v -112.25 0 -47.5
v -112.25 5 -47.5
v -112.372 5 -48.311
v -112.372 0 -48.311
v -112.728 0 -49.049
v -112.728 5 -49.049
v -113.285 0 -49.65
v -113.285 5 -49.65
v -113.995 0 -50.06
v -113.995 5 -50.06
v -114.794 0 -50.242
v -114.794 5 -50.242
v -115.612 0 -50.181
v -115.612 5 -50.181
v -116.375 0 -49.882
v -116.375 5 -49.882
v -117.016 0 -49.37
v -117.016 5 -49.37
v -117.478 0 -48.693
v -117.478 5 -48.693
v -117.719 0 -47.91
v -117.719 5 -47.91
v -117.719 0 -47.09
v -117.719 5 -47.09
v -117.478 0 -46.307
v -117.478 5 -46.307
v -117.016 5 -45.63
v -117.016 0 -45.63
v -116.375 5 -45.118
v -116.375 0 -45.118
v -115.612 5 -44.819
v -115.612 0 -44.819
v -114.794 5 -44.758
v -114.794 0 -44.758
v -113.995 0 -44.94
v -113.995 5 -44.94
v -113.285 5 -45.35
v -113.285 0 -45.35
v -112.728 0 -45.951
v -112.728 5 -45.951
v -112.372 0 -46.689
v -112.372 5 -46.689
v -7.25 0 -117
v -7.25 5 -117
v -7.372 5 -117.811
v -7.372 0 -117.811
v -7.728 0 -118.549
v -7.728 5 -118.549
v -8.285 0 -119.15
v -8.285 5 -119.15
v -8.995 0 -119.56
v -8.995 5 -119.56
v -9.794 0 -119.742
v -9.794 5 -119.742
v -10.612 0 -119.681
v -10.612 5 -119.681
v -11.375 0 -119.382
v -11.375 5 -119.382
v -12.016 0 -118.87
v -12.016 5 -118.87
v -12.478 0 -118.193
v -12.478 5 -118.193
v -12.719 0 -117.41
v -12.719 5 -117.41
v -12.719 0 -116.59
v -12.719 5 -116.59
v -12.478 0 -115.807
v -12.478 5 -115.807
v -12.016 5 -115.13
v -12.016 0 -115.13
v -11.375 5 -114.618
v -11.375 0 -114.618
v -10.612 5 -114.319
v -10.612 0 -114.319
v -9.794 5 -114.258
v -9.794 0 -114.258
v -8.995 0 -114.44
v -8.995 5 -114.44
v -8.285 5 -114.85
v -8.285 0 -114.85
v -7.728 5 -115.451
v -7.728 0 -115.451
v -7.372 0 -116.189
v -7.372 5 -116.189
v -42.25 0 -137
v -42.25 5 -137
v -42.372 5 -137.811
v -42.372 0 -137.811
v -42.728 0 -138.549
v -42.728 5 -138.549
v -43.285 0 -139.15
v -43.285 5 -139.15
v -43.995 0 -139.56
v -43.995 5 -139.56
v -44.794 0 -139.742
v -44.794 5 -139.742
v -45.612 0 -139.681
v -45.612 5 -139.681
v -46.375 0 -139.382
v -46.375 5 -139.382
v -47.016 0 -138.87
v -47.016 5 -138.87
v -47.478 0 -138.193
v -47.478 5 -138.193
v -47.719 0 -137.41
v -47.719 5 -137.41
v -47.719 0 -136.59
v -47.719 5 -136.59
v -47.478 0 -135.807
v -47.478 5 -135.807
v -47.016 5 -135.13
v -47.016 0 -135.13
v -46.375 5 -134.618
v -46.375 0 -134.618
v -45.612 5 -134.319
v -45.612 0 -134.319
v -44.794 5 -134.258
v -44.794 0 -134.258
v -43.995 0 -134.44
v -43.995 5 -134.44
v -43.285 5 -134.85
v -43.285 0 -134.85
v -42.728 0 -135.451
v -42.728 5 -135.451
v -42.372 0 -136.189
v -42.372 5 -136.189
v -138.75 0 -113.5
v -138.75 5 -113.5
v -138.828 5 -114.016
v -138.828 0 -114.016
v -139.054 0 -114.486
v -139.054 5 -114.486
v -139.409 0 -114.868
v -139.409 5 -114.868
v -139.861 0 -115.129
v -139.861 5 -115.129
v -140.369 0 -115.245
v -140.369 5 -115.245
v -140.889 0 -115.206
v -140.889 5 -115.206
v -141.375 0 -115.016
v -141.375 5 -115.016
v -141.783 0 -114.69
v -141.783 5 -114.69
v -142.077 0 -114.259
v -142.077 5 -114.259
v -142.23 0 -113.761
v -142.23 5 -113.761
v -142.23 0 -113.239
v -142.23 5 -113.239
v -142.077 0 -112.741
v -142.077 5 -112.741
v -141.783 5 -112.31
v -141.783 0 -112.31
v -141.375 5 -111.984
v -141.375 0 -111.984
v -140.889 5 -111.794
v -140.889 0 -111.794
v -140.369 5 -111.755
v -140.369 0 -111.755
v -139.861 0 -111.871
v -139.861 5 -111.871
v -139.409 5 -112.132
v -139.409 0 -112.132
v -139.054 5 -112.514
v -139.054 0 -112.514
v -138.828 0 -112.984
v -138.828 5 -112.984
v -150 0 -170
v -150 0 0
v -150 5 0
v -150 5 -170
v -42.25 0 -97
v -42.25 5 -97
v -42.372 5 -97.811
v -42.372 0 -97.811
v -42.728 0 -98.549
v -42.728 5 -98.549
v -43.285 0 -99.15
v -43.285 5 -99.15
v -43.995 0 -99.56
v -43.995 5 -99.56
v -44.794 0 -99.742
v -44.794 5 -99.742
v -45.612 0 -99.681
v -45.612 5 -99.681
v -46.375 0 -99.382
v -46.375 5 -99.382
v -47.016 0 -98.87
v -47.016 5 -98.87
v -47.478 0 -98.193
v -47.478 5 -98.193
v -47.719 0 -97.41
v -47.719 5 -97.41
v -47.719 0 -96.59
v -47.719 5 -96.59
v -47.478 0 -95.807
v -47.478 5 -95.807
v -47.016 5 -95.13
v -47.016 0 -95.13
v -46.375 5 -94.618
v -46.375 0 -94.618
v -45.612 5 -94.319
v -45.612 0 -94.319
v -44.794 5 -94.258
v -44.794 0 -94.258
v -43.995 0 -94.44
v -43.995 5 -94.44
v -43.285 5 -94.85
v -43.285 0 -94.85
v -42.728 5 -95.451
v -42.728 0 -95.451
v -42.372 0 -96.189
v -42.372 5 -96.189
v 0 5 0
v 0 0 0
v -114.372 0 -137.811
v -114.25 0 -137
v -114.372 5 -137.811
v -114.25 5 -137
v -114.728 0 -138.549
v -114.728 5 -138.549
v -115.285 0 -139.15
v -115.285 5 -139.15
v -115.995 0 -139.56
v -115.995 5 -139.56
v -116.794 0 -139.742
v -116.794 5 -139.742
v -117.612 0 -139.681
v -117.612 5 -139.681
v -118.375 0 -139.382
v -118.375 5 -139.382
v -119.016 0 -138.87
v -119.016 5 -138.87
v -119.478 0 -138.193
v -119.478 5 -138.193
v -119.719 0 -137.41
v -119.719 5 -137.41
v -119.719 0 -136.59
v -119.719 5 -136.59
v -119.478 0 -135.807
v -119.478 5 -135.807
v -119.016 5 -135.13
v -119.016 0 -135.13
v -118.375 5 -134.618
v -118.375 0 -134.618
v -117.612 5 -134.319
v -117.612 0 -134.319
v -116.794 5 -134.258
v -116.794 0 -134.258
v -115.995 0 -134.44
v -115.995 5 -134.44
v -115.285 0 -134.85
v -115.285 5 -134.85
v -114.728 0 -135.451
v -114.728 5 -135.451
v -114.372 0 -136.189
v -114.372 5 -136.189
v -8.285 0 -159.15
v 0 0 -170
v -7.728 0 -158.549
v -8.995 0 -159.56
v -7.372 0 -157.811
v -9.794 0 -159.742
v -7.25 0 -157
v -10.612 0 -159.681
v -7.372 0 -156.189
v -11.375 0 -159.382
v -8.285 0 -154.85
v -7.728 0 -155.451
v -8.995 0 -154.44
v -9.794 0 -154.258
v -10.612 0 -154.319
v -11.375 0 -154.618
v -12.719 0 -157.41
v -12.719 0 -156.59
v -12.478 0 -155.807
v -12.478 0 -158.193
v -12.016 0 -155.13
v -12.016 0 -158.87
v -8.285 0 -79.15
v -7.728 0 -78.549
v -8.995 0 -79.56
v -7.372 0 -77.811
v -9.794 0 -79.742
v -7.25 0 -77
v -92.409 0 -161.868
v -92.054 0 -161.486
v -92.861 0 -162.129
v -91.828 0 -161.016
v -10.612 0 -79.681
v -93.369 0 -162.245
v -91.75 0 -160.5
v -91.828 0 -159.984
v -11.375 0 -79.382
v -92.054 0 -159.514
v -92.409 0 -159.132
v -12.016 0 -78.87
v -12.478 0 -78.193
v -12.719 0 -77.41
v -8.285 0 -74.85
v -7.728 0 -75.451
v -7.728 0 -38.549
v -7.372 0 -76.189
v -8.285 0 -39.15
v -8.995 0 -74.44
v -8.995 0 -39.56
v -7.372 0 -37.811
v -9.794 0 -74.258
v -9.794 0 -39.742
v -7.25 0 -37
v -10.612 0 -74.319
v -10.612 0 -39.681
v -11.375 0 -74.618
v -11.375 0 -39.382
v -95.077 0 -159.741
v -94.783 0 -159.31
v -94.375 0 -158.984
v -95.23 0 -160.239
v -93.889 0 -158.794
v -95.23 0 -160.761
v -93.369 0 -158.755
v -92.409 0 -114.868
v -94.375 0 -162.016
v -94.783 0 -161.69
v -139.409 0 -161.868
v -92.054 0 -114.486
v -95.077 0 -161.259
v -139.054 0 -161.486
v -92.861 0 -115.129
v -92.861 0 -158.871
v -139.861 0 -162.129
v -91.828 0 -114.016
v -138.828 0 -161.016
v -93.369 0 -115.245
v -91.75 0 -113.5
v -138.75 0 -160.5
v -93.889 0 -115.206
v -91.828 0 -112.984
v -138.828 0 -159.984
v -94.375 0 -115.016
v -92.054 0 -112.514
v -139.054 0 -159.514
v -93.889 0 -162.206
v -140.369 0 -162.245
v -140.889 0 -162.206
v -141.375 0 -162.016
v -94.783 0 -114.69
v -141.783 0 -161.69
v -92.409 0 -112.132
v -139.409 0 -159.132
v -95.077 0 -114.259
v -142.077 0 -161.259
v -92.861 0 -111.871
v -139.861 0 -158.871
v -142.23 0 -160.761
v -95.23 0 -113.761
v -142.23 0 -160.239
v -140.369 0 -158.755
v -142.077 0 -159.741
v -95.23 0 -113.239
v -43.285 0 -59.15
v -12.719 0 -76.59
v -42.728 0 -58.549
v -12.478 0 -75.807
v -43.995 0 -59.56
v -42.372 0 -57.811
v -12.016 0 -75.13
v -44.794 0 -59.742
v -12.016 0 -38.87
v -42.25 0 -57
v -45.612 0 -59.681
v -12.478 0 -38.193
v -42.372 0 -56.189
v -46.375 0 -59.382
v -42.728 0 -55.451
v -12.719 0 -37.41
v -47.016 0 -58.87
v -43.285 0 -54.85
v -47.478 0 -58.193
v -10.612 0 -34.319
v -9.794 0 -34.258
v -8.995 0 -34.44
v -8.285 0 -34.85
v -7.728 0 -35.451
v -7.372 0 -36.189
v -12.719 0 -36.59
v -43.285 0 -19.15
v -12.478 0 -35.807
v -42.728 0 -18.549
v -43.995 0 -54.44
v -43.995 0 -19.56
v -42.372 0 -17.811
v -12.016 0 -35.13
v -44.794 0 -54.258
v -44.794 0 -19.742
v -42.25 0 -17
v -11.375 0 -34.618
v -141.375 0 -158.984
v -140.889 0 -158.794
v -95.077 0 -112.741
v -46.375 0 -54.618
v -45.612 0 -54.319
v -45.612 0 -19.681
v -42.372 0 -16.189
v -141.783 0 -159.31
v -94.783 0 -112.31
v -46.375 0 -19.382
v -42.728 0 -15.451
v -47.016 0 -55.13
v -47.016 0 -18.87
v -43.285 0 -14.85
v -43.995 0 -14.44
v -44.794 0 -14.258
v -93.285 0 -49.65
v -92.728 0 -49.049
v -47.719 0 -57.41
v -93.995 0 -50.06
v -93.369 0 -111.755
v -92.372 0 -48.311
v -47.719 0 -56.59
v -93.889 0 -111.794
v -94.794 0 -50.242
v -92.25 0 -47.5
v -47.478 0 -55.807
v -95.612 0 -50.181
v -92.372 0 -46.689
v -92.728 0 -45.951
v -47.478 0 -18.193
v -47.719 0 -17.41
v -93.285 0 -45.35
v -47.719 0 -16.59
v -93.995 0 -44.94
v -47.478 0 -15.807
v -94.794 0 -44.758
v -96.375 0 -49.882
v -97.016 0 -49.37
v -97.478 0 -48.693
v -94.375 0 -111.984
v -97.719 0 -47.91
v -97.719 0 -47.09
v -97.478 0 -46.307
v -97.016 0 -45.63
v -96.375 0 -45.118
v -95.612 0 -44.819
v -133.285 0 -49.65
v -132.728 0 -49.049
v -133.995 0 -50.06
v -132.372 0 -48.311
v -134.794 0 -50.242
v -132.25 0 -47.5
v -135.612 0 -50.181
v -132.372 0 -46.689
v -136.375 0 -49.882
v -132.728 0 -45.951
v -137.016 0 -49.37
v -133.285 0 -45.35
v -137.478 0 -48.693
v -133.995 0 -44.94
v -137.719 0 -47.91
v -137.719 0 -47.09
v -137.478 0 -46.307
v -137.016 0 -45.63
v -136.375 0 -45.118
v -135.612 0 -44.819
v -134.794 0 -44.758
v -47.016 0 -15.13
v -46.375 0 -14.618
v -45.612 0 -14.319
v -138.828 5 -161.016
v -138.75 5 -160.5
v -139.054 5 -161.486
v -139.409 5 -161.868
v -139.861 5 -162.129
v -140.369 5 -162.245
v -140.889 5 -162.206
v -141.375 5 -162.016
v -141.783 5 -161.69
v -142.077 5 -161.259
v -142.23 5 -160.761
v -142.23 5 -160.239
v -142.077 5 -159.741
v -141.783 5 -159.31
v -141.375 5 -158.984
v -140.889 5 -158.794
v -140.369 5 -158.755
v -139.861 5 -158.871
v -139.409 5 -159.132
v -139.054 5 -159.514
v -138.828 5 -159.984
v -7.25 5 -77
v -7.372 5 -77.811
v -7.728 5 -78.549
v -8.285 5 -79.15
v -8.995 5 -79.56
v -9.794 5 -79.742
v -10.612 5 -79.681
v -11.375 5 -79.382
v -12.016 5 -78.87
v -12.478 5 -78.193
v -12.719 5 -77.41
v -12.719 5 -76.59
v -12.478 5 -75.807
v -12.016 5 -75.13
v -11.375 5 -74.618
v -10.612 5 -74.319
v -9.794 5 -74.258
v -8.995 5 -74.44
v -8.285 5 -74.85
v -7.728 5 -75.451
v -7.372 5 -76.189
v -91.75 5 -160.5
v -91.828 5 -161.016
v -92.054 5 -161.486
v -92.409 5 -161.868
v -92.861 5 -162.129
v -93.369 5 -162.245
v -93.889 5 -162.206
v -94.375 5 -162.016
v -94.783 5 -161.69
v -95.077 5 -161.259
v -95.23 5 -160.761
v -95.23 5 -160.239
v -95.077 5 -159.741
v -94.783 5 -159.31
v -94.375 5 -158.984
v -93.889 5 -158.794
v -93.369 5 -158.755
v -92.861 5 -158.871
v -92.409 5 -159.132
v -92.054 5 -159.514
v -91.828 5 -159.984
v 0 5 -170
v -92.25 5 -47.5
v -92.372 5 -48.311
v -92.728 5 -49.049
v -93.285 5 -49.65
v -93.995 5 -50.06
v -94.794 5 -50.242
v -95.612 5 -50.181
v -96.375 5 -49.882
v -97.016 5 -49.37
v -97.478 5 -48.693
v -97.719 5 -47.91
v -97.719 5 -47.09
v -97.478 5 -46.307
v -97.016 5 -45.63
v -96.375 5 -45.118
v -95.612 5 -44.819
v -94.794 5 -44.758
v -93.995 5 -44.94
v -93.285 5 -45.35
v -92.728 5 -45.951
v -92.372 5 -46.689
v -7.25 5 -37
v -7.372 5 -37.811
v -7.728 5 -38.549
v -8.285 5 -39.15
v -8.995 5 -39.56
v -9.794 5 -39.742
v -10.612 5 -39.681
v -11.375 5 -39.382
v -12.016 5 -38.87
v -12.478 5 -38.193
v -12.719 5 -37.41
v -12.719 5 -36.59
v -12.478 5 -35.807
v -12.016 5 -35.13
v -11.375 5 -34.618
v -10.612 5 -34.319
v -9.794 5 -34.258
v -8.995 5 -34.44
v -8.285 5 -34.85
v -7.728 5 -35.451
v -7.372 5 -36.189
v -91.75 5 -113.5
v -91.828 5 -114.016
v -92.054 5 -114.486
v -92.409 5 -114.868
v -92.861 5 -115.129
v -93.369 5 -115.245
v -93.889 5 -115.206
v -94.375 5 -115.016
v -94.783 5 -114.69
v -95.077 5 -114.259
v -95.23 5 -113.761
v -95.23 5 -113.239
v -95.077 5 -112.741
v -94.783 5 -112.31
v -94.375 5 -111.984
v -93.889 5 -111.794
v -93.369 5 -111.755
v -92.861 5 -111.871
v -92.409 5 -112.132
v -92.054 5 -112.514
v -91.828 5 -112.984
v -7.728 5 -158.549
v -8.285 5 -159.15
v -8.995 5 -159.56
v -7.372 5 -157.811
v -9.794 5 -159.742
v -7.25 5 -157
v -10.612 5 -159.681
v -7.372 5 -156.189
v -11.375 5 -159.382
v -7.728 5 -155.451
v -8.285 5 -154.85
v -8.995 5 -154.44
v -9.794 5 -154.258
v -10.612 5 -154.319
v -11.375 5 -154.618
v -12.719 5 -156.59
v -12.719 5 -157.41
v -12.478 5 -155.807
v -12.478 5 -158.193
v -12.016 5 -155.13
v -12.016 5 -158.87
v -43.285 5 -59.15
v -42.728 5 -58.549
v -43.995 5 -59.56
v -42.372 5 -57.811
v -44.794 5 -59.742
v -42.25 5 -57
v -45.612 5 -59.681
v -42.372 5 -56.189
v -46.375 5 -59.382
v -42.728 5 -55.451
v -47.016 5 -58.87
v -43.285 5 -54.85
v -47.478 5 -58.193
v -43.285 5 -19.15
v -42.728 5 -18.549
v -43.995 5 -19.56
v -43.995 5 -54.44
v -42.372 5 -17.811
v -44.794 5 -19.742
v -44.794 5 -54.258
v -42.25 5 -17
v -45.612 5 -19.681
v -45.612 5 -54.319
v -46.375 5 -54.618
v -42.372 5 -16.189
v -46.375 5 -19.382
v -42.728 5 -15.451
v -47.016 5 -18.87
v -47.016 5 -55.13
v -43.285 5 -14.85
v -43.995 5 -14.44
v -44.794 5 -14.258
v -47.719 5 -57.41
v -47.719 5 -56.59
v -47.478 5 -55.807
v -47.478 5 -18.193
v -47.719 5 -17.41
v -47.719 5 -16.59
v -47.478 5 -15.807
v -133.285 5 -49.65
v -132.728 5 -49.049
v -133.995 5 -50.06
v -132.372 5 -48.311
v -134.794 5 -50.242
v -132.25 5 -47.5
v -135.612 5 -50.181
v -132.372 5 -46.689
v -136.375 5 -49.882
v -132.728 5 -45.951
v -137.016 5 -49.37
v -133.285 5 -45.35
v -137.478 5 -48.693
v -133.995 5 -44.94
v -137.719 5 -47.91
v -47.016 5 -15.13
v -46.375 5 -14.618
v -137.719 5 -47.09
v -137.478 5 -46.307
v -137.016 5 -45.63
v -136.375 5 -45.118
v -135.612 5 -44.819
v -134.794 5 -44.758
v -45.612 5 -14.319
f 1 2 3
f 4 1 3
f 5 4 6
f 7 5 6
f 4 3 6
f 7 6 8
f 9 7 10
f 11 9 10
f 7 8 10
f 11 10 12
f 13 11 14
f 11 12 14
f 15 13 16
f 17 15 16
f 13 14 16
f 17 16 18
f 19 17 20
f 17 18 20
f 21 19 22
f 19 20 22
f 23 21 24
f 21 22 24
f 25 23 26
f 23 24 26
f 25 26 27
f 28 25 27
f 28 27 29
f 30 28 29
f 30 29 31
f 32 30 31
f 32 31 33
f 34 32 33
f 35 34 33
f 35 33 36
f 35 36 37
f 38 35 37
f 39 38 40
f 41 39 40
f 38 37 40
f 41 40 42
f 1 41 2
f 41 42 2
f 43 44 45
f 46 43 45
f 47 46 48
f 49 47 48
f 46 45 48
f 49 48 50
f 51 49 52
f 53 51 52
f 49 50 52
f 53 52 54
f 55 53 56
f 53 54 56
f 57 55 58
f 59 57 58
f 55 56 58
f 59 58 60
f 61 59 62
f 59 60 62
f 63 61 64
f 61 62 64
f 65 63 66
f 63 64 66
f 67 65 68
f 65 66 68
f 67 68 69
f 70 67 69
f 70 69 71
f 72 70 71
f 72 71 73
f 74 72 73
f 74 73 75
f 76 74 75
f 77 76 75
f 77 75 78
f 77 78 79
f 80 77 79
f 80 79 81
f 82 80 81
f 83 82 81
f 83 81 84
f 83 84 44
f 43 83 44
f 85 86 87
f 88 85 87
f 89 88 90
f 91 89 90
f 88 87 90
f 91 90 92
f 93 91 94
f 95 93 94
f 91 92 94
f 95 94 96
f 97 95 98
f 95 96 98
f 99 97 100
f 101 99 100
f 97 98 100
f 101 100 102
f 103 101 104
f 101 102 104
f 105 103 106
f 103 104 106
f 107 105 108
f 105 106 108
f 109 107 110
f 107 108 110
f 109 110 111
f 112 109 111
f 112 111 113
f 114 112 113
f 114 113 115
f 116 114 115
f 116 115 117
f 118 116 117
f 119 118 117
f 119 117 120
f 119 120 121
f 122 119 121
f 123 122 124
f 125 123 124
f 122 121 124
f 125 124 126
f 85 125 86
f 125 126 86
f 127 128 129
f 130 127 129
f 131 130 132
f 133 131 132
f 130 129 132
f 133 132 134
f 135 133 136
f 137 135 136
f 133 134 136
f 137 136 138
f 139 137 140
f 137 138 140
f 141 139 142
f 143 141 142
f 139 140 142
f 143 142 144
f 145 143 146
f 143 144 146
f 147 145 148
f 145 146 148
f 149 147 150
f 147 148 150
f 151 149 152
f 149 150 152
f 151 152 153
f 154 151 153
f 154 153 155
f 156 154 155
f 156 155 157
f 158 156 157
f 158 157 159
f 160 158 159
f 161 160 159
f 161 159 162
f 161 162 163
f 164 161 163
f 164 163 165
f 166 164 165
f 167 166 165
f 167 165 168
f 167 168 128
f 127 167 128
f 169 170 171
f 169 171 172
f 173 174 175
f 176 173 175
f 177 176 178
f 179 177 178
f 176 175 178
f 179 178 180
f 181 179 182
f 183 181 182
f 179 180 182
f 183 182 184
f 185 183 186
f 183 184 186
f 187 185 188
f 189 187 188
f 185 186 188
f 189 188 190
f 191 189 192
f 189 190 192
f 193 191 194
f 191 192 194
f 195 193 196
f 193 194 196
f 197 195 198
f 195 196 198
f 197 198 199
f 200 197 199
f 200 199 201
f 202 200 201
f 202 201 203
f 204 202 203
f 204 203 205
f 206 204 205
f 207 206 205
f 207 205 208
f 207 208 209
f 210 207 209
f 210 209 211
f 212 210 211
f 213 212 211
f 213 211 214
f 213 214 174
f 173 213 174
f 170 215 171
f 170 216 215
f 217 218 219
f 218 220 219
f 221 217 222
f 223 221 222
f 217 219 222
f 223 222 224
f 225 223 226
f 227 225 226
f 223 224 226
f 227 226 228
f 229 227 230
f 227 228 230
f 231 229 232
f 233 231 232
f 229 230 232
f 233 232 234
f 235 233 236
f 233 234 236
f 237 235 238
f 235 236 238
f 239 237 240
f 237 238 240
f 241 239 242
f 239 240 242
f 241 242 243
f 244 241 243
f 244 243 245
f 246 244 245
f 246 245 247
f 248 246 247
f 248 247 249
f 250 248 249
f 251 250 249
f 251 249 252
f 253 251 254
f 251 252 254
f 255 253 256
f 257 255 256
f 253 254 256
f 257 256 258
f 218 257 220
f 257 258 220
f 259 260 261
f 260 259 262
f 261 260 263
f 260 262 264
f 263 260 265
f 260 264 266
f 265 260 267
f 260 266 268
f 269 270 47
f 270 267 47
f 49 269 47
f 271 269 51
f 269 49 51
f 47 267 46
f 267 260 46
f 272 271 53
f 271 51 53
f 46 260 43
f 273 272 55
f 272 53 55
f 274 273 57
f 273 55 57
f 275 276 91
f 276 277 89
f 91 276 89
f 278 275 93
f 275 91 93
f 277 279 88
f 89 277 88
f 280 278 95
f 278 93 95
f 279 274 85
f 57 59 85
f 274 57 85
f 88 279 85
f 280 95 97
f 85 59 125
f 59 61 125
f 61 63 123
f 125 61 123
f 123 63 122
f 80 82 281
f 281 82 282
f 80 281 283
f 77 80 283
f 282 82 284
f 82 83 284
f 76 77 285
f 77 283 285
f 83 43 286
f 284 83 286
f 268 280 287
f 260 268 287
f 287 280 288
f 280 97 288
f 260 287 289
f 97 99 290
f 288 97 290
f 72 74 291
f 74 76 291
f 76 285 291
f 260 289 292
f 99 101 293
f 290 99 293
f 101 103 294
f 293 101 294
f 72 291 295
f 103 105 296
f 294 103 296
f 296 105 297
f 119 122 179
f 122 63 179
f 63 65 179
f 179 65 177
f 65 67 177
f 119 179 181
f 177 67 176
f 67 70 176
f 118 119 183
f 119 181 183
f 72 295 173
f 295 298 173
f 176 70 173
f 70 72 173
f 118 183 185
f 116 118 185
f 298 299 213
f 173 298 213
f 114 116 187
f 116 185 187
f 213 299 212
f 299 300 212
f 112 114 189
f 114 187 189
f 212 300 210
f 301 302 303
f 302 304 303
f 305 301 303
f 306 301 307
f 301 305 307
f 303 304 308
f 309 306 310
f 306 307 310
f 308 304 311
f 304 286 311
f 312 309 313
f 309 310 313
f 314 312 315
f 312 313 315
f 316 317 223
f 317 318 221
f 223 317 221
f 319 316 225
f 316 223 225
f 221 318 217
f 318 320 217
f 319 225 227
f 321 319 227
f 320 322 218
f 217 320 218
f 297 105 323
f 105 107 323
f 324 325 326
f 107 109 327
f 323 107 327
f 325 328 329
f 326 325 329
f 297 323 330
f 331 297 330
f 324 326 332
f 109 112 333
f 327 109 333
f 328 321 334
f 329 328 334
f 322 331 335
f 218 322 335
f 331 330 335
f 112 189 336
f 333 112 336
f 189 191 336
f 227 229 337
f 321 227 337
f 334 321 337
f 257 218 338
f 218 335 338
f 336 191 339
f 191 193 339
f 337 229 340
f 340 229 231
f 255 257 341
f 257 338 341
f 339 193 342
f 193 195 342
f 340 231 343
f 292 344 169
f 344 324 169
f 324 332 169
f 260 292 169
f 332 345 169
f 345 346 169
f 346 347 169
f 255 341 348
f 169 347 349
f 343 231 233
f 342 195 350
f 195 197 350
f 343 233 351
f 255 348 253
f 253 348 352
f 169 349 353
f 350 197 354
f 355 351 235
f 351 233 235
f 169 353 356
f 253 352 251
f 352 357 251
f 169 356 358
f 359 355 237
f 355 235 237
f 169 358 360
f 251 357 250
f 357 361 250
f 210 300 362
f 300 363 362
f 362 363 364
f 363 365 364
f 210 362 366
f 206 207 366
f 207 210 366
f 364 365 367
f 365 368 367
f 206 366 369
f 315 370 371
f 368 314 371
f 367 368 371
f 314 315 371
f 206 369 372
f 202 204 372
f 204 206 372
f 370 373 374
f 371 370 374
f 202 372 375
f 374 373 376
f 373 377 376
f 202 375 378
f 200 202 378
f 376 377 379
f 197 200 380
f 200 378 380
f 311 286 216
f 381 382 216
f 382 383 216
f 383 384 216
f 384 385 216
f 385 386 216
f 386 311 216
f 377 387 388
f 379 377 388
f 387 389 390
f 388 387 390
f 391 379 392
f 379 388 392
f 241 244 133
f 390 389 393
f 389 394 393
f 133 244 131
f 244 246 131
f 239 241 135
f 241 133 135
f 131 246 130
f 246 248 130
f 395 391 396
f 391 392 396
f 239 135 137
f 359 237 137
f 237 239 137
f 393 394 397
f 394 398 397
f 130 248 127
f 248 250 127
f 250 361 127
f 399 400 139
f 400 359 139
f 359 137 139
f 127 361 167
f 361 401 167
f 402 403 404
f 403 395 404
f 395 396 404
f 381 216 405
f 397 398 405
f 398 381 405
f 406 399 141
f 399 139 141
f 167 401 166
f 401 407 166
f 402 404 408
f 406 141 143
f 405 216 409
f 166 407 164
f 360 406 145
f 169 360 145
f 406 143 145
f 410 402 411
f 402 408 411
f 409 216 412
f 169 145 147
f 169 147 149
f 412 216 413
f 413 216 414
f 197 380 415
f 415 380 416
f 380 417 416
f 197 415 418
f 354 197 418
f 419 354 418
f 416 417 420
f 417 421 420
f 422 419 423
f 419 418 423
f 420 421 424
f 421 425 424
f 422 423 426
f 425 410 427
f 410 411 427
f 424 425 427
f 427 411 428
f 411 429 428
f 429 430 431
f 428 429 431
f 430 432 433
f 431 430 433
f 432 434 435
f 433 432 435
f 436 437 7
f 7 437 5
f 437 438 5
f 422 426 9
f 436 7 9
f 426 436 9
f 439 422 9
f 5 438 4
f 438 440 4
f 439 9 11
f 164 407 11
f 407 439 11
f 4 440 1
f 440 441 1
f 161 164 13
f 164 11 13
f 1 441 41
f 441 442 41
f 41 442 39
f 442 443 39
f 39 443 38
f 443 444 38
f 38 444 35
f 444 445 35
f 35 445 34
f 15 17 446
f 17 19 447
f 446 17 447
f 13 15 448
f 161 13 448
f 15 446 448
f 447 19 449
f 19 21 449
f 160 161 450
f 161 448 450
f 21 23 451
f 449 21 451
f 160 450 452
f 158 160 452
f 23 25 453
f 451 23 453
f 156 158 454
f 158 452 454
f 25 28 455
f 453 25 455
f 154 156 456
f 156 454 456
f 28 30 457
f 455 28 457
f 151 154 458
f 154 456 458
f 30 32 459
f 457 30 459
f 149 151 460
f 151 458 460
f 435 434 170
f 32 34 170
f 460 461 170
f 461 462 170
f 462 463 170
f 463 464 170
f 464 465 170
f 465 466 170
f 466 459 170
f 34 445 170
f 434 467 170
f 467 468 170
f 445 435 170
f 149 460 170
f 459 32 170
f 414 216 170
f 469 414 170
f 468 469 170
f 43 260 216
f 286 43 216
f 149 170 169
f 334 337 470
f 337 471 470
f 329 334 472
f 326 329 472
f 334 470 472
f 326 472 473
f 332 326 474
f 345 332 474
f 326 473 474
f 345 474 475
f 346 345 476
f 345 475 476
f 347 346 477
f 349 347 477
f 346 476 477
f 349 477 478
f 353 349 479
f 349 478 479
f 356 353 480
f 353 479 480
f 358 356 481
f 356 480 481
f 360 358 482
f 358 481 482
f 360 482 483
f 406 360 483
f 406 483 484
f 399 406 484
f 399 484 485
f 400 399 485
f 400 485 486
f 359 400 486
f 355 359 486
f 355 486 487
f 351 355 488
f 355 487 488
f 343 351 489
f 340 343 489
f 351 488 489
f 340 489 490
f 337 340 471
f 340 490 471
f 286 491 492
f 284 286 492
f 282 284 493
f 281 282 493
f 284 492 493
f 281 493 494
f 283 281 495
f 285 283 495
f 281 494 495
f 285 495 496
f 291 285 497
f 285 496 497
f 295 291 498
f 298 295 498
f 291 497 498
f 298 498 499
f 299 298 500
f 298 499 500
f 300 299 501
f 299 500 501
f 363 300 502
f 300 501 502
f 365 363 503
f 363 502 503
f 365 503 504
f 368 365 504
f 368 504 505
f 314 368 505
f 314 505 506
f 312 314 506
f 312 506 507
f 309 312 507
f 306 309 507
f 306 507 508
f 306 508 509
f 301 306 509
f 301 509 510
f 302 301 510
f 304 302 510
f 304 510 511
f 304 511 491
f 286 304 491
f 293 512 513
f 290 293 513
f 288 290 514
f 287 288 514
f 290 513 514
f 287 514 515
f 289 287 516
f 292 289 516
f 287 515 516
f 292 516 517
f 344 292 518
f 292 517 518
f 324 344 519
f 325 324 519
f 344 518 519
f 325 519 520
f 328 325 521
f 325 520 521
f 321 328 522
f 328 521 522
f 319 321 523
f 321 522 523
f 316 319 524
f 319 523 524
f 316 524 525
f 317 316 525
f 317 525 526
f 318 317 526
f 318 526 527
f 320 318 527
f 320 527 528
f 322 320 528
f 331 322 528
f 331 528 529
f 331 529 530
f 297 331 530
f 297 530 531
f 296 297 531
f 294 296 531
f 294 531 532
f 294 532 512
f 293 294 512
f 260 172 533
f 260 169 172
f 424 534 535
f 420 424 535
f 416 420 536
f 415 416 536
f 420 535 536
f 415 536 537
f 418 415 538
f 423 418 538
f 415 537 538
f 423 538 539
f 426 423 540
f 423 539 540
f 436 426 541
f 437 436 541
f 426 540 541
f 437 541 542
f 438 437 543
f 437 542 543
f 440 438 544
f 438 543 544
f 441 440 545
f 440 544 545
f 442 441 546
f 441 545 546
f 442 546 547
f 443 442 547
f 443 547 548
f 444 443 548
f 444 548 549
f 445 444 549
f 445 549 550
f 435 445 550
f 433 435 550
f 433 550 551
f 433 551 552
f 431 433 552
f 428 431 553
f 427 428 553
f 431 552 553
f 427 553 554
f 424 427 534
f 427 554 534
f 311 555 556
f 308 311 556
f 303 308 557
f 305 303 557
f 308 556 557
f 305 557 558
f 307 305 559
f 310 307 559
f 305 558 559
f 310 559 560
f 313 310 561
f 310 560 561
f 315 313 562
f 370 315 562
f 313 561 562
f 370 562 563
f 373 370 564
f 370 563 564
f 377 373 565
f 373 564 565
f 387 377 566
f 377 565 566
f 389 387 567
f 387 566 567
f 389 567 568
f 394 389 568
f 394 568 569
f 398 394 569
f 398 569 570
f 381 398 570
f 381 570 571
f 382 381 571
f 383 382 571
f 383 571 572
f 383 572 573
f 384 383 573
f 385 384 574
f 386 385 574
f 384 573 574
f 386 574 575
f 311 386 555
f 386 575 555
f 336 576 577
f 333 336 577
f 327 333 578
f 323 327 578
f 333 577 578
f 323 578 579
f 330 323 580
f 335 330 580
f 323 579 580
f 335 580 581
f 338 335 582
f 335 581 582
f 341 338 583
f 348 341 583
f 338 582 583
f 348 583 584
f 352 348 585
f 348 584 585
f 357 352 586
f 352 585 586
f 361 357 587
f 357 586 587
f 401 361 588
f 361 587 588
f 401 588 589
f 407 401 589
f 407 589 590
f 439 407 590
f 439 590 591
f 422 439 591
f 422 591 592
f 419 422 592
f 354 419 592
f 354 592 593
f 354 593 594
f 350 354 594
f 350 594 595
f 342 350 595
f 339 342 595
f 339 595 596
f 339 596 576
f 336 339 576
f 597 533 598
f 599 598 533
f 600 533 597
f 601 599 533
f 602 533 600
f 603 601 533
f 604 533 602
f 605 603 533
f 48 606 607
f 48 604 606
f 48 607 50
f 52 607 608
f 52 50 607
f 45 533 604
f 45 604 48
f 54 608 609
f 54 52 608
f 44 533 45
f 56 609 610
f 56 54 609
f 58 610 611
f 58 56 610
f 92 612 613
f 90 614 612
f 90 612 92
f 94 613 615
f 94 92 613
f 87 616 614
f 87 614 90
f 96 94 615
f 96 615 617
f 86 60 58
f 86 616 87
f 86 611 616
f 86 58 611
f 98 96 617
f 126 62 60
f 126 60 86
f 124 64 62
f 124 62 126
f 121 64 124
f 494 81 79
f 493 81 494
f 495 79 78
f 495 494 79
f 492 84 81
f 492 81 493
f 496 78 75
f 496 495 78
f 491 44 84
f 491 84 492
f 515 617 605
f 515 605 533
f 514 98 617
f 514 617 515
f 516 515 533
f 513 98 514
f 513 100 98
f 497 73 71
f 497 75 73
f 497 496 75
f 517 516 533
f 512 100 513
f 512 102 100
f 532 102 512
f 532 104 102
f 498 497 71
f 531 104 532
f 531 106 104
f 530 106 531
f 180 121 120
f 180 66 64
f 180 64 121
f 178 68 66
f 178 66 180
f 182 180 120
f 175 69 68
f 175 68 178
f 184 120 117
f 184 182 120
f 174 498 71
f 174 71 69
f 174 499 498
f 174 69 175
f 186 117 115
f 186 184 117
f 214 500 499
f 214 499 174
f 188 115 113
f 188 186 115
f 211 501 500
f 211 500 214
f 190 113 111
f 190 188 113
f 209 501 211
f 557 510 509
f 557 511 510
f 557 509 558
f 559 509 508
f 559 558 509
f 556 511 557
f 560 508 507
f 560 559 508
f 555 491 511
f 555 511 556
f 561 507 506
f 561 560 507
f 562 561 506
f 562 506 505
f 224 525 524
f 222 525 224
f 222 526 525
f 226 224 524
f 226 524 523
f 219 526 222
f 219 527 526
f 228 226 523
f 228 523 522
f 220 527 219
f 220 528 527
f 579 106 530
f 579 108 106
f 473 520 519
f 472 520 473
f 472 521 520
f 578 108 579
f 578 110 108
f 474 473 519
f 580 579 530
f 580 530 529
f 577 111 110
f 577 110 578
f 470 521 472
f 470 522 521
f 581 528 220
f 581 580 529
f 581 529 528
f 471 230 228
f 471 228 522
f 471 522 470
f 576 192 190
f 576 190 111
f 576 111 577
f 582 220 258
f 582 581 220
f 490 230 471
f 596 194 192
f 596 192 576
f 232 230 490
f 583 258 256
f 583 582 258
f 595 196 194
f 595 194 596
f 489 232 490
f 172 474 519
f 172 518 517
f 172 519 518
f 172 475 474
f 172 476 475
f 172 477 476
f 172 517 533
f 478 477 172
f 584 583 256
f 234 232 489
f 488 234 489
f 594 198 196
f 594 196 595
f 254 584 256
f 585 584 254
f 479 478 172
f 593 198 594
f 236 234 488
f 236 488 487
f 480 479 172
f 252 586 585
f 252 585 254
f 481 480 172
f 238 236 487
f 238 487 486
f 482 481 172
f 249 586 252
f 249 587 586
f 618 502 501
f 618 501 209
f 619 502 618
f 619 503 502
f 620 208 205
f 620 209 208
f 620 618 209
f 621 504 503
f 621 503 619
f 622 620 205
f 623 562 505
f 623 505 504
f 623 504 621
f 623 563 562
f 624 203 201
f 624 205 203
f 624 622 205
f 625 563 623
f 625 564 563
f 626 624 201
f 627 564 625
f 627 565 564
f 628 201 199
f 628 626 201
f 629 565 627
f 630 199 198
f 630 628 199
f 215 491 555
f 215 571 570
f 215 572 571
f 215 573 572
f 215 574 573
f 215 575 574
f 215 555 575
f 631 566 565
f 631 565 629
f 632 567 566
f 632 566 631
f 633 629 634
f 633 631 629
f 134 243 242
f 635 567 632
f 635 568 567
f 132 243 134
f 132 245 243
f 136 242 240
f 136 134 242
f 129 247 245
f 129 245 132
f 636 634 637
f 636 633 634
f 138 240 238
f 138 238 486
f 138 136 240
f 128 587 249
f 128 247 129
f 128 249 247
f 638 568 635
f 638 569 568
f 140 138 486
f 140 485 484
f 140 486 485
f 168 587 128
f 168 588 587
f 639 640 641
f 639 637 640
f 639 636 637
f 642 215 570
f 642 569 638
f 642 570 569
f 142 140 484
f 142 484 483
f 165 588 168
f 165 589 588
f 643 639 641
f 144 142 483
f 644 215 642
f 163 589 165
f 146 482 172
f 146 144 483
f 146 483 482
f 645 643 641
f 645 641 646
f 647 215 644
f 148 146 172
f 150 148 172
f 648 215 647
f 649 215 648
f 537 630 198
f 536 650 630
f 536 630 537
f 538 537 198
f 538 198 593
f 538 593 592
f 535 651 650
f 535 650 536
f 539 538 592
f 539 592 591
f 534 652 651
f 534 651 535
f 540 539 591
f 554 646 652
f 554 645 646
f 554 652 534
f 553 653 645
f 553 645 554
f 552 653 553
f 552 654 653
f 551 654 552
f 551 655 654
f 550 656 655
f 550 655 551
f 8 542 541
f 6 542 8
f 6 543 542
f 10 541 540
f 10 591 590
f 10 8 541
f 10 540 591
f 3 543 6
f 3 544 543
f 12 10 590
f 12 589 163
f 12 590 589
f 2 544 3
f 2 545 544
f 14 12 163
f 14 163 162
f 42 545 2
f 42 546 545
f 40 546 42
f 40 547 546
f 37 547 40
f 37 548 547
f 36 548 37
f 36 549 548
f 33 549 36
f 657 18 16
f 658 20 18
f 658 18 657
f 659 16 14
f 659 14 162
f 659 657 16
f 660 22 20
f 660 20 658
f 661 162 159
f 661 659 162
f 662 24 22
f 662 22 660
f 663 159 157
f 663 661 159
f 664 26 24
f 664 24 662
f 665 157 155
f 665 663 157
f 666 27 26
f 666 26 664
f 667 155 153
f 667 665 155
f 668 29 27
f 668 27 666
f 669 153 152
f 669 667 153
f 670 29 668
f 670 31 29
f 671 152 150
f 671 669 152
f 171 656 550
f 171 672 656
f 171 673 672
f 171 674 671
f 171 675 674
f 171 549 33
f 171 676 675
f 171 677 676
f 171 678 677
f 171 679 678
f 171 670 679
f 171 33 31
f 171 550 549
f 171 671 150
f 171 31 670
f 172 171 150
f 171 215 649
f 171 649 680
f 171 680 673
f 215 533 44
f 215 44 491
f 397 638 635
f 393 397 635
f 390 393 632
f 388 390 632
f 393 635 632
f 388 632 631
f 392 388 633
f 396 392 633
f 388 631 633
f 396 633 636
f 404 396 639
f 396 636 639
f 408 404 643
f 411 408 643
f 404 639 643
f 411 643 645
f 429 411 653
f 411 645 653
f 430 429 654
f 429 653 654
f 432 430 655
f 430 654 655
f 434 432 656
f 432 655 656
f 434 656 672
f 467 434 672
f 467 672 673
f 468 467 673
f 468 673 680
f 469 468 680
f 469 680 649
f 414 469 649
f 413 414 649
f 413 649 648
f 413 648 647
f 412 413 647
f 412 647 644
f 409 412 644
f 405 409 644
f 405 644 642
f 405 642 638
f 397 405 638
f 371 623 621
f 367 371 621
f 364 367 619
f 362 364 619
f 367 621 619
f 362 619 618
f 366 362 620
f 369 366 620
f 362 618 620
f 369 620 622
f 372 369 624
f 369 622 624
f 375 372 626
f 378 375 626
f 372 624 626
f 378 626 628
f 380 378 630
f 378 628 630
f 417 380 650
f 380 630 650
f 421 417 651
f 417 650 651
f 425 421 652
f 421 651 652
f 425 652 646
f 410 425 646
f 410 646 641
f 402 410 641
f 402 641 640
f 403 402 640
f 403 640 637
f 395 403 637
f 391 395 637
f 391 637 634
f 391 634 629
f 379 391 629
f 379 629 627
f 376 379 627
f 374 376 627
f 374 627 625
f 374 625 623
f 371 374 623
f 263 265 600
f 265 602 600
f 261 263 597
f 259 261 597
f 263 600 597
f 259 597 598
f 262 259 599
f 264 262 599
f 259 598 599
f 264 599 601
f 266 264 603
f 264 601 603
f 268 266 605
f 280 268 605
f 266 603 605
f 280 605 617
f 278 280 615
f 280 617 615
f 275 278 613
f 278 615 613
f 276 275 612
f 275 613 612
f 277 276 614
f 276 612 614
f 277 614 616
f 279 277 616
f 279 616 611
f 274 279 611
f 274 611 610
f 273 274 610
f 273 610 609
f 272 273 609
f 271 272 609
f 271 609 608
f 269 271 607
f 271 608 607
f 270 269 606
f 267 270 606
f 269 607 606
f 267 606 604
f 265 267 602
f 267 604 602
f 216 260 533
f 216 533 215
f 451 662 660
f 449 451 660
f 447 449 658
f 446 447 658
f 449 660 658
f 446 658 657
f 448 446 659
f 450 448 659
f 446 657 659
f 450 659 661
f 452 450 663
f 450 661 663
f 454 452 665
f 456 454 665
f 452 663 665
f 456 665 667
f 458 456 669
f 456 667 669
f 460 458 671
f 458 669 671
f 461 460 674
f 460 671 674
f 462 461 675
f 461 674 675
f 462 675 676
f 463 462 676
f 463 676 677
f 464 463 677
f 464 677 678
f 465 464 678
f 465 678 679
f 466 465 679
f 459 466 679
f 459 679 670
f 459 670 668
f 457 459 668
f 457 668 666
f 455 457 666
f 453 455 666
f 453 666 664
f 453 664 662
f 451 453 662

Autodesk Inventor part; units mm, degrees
ref_plane "YZ Plane" through (0, 0, 0) normal (1, 0, 0) x (0, 1, 0)
ref_plane "XZ Plane" through (0, 0, 0) normal (0, 1, 0) x (-1, 0, 0)
ref_plane "XY Plane" through (0, 0, 0) normal (0, 0, 1) x (1, 0, 0)
sketch "Sketch1" plane through (0, 0, 0) normal (0, 1, 0) x (-1, 0, 0)
  line L0 (0, 0) -> (150, 0)
  line L1 (150, 0) -> (150, -170)
  line L2 (150, -170) -> (0, -170)
  line L3 (0, -170) -> (0, 0)
  dimension "d0" = 150
  dimension "d1" = 170
extrude "Extrusion1" add sketch "Sketch1" along normal blind 5
sketch "Sketch2" plane through (0, 5, 0) normal (0, 1, 0) x (1, 0, 0)
  line L0 (-150, 170) -> (-150, 0) projected
  line L1 (-150, 0) -> (0, 0) projected
  line L2 (0, 0) -> (0, 170) projected
  line L3 (0, 170) -> (-150, 170) projected
  circle A0 centre (-117, 137) radius 2.75
  circle A1 centre (-140.5, 160.5) radius 1.75
  circle A2 centre (-140.5, 113.5) radius 1.75
  circle A3 centre (-93.5, 160.5) radius 1.75
  circle A4 centre (-93.5, 113.5) radius 1.75
  circle A5 centre (-45, 137) radius 2.75
  circle A6 centre (-10, 157) radius 2.75
  circle A7 centre (-115, 47.5) radius 2.75
  circle A8 centre (-95, 47.5) radius 2.75
  circle A9 centre (-135, 47.5) radius 2.75
  circle A10 centre (-45, 97) radius 2.75
  circle A11 centre (-45, 57) radius 2.75
  circle A12 centre (-45, 17) radius 2.75
  circle A13 centre (-10, 117) radius 2.75
  circle A14 centre (-10, 77) radius 2.75
  circle A15 centre (-10, 37) radius 2.75
  dimension "d5" = 5.5
  dimension "d8" = 3.5
  dimension "d9" = 9.5
  dimension "d10" = 9.5
  dimension "d13" = 47
  dimension "d16" = 47
  dimension "d23" = 5.5
  dimension "d24" = 5.5
  dimension "d25" = 33
  dimension "d26" = 13
  dimension "d28" = 170
  dimension "d36" = 10
  dimension "d40" = 45
  dimension "d43" = 5.5
  dimension "d44" = 5.5
  dimension "d48" = 20
  dimension "d49" = 35
  dimension "d50" = 5.5
  dimension "d51" = 20
  dimension "d53" = 23.5
  dimension "d54" = 23.5
  dimension "d55" = 33
  dimension "d58" = 40
  dimension "d65" = 40
extrude "Extrusion3" cut sketch "Sketch2" against normal blind 10 contours A0 | A1 | A2 | A3 | A4 | A5 | A6 | A7 | A8 | A9 | A10 | A11 | A12 | A13 | A14 | A15
equation "\"d16\" = d13"
equation "\"d36\" = d34"
equation "\"d40\" = d37"
equation "\"d53\" = 0.5 * d13"
equation "\"d54\" = d53"
equation "\"d34\" = 10"
equation "\"d37\" = 45"
properties part number "HeadPlate" material "Steel, Carbon"
